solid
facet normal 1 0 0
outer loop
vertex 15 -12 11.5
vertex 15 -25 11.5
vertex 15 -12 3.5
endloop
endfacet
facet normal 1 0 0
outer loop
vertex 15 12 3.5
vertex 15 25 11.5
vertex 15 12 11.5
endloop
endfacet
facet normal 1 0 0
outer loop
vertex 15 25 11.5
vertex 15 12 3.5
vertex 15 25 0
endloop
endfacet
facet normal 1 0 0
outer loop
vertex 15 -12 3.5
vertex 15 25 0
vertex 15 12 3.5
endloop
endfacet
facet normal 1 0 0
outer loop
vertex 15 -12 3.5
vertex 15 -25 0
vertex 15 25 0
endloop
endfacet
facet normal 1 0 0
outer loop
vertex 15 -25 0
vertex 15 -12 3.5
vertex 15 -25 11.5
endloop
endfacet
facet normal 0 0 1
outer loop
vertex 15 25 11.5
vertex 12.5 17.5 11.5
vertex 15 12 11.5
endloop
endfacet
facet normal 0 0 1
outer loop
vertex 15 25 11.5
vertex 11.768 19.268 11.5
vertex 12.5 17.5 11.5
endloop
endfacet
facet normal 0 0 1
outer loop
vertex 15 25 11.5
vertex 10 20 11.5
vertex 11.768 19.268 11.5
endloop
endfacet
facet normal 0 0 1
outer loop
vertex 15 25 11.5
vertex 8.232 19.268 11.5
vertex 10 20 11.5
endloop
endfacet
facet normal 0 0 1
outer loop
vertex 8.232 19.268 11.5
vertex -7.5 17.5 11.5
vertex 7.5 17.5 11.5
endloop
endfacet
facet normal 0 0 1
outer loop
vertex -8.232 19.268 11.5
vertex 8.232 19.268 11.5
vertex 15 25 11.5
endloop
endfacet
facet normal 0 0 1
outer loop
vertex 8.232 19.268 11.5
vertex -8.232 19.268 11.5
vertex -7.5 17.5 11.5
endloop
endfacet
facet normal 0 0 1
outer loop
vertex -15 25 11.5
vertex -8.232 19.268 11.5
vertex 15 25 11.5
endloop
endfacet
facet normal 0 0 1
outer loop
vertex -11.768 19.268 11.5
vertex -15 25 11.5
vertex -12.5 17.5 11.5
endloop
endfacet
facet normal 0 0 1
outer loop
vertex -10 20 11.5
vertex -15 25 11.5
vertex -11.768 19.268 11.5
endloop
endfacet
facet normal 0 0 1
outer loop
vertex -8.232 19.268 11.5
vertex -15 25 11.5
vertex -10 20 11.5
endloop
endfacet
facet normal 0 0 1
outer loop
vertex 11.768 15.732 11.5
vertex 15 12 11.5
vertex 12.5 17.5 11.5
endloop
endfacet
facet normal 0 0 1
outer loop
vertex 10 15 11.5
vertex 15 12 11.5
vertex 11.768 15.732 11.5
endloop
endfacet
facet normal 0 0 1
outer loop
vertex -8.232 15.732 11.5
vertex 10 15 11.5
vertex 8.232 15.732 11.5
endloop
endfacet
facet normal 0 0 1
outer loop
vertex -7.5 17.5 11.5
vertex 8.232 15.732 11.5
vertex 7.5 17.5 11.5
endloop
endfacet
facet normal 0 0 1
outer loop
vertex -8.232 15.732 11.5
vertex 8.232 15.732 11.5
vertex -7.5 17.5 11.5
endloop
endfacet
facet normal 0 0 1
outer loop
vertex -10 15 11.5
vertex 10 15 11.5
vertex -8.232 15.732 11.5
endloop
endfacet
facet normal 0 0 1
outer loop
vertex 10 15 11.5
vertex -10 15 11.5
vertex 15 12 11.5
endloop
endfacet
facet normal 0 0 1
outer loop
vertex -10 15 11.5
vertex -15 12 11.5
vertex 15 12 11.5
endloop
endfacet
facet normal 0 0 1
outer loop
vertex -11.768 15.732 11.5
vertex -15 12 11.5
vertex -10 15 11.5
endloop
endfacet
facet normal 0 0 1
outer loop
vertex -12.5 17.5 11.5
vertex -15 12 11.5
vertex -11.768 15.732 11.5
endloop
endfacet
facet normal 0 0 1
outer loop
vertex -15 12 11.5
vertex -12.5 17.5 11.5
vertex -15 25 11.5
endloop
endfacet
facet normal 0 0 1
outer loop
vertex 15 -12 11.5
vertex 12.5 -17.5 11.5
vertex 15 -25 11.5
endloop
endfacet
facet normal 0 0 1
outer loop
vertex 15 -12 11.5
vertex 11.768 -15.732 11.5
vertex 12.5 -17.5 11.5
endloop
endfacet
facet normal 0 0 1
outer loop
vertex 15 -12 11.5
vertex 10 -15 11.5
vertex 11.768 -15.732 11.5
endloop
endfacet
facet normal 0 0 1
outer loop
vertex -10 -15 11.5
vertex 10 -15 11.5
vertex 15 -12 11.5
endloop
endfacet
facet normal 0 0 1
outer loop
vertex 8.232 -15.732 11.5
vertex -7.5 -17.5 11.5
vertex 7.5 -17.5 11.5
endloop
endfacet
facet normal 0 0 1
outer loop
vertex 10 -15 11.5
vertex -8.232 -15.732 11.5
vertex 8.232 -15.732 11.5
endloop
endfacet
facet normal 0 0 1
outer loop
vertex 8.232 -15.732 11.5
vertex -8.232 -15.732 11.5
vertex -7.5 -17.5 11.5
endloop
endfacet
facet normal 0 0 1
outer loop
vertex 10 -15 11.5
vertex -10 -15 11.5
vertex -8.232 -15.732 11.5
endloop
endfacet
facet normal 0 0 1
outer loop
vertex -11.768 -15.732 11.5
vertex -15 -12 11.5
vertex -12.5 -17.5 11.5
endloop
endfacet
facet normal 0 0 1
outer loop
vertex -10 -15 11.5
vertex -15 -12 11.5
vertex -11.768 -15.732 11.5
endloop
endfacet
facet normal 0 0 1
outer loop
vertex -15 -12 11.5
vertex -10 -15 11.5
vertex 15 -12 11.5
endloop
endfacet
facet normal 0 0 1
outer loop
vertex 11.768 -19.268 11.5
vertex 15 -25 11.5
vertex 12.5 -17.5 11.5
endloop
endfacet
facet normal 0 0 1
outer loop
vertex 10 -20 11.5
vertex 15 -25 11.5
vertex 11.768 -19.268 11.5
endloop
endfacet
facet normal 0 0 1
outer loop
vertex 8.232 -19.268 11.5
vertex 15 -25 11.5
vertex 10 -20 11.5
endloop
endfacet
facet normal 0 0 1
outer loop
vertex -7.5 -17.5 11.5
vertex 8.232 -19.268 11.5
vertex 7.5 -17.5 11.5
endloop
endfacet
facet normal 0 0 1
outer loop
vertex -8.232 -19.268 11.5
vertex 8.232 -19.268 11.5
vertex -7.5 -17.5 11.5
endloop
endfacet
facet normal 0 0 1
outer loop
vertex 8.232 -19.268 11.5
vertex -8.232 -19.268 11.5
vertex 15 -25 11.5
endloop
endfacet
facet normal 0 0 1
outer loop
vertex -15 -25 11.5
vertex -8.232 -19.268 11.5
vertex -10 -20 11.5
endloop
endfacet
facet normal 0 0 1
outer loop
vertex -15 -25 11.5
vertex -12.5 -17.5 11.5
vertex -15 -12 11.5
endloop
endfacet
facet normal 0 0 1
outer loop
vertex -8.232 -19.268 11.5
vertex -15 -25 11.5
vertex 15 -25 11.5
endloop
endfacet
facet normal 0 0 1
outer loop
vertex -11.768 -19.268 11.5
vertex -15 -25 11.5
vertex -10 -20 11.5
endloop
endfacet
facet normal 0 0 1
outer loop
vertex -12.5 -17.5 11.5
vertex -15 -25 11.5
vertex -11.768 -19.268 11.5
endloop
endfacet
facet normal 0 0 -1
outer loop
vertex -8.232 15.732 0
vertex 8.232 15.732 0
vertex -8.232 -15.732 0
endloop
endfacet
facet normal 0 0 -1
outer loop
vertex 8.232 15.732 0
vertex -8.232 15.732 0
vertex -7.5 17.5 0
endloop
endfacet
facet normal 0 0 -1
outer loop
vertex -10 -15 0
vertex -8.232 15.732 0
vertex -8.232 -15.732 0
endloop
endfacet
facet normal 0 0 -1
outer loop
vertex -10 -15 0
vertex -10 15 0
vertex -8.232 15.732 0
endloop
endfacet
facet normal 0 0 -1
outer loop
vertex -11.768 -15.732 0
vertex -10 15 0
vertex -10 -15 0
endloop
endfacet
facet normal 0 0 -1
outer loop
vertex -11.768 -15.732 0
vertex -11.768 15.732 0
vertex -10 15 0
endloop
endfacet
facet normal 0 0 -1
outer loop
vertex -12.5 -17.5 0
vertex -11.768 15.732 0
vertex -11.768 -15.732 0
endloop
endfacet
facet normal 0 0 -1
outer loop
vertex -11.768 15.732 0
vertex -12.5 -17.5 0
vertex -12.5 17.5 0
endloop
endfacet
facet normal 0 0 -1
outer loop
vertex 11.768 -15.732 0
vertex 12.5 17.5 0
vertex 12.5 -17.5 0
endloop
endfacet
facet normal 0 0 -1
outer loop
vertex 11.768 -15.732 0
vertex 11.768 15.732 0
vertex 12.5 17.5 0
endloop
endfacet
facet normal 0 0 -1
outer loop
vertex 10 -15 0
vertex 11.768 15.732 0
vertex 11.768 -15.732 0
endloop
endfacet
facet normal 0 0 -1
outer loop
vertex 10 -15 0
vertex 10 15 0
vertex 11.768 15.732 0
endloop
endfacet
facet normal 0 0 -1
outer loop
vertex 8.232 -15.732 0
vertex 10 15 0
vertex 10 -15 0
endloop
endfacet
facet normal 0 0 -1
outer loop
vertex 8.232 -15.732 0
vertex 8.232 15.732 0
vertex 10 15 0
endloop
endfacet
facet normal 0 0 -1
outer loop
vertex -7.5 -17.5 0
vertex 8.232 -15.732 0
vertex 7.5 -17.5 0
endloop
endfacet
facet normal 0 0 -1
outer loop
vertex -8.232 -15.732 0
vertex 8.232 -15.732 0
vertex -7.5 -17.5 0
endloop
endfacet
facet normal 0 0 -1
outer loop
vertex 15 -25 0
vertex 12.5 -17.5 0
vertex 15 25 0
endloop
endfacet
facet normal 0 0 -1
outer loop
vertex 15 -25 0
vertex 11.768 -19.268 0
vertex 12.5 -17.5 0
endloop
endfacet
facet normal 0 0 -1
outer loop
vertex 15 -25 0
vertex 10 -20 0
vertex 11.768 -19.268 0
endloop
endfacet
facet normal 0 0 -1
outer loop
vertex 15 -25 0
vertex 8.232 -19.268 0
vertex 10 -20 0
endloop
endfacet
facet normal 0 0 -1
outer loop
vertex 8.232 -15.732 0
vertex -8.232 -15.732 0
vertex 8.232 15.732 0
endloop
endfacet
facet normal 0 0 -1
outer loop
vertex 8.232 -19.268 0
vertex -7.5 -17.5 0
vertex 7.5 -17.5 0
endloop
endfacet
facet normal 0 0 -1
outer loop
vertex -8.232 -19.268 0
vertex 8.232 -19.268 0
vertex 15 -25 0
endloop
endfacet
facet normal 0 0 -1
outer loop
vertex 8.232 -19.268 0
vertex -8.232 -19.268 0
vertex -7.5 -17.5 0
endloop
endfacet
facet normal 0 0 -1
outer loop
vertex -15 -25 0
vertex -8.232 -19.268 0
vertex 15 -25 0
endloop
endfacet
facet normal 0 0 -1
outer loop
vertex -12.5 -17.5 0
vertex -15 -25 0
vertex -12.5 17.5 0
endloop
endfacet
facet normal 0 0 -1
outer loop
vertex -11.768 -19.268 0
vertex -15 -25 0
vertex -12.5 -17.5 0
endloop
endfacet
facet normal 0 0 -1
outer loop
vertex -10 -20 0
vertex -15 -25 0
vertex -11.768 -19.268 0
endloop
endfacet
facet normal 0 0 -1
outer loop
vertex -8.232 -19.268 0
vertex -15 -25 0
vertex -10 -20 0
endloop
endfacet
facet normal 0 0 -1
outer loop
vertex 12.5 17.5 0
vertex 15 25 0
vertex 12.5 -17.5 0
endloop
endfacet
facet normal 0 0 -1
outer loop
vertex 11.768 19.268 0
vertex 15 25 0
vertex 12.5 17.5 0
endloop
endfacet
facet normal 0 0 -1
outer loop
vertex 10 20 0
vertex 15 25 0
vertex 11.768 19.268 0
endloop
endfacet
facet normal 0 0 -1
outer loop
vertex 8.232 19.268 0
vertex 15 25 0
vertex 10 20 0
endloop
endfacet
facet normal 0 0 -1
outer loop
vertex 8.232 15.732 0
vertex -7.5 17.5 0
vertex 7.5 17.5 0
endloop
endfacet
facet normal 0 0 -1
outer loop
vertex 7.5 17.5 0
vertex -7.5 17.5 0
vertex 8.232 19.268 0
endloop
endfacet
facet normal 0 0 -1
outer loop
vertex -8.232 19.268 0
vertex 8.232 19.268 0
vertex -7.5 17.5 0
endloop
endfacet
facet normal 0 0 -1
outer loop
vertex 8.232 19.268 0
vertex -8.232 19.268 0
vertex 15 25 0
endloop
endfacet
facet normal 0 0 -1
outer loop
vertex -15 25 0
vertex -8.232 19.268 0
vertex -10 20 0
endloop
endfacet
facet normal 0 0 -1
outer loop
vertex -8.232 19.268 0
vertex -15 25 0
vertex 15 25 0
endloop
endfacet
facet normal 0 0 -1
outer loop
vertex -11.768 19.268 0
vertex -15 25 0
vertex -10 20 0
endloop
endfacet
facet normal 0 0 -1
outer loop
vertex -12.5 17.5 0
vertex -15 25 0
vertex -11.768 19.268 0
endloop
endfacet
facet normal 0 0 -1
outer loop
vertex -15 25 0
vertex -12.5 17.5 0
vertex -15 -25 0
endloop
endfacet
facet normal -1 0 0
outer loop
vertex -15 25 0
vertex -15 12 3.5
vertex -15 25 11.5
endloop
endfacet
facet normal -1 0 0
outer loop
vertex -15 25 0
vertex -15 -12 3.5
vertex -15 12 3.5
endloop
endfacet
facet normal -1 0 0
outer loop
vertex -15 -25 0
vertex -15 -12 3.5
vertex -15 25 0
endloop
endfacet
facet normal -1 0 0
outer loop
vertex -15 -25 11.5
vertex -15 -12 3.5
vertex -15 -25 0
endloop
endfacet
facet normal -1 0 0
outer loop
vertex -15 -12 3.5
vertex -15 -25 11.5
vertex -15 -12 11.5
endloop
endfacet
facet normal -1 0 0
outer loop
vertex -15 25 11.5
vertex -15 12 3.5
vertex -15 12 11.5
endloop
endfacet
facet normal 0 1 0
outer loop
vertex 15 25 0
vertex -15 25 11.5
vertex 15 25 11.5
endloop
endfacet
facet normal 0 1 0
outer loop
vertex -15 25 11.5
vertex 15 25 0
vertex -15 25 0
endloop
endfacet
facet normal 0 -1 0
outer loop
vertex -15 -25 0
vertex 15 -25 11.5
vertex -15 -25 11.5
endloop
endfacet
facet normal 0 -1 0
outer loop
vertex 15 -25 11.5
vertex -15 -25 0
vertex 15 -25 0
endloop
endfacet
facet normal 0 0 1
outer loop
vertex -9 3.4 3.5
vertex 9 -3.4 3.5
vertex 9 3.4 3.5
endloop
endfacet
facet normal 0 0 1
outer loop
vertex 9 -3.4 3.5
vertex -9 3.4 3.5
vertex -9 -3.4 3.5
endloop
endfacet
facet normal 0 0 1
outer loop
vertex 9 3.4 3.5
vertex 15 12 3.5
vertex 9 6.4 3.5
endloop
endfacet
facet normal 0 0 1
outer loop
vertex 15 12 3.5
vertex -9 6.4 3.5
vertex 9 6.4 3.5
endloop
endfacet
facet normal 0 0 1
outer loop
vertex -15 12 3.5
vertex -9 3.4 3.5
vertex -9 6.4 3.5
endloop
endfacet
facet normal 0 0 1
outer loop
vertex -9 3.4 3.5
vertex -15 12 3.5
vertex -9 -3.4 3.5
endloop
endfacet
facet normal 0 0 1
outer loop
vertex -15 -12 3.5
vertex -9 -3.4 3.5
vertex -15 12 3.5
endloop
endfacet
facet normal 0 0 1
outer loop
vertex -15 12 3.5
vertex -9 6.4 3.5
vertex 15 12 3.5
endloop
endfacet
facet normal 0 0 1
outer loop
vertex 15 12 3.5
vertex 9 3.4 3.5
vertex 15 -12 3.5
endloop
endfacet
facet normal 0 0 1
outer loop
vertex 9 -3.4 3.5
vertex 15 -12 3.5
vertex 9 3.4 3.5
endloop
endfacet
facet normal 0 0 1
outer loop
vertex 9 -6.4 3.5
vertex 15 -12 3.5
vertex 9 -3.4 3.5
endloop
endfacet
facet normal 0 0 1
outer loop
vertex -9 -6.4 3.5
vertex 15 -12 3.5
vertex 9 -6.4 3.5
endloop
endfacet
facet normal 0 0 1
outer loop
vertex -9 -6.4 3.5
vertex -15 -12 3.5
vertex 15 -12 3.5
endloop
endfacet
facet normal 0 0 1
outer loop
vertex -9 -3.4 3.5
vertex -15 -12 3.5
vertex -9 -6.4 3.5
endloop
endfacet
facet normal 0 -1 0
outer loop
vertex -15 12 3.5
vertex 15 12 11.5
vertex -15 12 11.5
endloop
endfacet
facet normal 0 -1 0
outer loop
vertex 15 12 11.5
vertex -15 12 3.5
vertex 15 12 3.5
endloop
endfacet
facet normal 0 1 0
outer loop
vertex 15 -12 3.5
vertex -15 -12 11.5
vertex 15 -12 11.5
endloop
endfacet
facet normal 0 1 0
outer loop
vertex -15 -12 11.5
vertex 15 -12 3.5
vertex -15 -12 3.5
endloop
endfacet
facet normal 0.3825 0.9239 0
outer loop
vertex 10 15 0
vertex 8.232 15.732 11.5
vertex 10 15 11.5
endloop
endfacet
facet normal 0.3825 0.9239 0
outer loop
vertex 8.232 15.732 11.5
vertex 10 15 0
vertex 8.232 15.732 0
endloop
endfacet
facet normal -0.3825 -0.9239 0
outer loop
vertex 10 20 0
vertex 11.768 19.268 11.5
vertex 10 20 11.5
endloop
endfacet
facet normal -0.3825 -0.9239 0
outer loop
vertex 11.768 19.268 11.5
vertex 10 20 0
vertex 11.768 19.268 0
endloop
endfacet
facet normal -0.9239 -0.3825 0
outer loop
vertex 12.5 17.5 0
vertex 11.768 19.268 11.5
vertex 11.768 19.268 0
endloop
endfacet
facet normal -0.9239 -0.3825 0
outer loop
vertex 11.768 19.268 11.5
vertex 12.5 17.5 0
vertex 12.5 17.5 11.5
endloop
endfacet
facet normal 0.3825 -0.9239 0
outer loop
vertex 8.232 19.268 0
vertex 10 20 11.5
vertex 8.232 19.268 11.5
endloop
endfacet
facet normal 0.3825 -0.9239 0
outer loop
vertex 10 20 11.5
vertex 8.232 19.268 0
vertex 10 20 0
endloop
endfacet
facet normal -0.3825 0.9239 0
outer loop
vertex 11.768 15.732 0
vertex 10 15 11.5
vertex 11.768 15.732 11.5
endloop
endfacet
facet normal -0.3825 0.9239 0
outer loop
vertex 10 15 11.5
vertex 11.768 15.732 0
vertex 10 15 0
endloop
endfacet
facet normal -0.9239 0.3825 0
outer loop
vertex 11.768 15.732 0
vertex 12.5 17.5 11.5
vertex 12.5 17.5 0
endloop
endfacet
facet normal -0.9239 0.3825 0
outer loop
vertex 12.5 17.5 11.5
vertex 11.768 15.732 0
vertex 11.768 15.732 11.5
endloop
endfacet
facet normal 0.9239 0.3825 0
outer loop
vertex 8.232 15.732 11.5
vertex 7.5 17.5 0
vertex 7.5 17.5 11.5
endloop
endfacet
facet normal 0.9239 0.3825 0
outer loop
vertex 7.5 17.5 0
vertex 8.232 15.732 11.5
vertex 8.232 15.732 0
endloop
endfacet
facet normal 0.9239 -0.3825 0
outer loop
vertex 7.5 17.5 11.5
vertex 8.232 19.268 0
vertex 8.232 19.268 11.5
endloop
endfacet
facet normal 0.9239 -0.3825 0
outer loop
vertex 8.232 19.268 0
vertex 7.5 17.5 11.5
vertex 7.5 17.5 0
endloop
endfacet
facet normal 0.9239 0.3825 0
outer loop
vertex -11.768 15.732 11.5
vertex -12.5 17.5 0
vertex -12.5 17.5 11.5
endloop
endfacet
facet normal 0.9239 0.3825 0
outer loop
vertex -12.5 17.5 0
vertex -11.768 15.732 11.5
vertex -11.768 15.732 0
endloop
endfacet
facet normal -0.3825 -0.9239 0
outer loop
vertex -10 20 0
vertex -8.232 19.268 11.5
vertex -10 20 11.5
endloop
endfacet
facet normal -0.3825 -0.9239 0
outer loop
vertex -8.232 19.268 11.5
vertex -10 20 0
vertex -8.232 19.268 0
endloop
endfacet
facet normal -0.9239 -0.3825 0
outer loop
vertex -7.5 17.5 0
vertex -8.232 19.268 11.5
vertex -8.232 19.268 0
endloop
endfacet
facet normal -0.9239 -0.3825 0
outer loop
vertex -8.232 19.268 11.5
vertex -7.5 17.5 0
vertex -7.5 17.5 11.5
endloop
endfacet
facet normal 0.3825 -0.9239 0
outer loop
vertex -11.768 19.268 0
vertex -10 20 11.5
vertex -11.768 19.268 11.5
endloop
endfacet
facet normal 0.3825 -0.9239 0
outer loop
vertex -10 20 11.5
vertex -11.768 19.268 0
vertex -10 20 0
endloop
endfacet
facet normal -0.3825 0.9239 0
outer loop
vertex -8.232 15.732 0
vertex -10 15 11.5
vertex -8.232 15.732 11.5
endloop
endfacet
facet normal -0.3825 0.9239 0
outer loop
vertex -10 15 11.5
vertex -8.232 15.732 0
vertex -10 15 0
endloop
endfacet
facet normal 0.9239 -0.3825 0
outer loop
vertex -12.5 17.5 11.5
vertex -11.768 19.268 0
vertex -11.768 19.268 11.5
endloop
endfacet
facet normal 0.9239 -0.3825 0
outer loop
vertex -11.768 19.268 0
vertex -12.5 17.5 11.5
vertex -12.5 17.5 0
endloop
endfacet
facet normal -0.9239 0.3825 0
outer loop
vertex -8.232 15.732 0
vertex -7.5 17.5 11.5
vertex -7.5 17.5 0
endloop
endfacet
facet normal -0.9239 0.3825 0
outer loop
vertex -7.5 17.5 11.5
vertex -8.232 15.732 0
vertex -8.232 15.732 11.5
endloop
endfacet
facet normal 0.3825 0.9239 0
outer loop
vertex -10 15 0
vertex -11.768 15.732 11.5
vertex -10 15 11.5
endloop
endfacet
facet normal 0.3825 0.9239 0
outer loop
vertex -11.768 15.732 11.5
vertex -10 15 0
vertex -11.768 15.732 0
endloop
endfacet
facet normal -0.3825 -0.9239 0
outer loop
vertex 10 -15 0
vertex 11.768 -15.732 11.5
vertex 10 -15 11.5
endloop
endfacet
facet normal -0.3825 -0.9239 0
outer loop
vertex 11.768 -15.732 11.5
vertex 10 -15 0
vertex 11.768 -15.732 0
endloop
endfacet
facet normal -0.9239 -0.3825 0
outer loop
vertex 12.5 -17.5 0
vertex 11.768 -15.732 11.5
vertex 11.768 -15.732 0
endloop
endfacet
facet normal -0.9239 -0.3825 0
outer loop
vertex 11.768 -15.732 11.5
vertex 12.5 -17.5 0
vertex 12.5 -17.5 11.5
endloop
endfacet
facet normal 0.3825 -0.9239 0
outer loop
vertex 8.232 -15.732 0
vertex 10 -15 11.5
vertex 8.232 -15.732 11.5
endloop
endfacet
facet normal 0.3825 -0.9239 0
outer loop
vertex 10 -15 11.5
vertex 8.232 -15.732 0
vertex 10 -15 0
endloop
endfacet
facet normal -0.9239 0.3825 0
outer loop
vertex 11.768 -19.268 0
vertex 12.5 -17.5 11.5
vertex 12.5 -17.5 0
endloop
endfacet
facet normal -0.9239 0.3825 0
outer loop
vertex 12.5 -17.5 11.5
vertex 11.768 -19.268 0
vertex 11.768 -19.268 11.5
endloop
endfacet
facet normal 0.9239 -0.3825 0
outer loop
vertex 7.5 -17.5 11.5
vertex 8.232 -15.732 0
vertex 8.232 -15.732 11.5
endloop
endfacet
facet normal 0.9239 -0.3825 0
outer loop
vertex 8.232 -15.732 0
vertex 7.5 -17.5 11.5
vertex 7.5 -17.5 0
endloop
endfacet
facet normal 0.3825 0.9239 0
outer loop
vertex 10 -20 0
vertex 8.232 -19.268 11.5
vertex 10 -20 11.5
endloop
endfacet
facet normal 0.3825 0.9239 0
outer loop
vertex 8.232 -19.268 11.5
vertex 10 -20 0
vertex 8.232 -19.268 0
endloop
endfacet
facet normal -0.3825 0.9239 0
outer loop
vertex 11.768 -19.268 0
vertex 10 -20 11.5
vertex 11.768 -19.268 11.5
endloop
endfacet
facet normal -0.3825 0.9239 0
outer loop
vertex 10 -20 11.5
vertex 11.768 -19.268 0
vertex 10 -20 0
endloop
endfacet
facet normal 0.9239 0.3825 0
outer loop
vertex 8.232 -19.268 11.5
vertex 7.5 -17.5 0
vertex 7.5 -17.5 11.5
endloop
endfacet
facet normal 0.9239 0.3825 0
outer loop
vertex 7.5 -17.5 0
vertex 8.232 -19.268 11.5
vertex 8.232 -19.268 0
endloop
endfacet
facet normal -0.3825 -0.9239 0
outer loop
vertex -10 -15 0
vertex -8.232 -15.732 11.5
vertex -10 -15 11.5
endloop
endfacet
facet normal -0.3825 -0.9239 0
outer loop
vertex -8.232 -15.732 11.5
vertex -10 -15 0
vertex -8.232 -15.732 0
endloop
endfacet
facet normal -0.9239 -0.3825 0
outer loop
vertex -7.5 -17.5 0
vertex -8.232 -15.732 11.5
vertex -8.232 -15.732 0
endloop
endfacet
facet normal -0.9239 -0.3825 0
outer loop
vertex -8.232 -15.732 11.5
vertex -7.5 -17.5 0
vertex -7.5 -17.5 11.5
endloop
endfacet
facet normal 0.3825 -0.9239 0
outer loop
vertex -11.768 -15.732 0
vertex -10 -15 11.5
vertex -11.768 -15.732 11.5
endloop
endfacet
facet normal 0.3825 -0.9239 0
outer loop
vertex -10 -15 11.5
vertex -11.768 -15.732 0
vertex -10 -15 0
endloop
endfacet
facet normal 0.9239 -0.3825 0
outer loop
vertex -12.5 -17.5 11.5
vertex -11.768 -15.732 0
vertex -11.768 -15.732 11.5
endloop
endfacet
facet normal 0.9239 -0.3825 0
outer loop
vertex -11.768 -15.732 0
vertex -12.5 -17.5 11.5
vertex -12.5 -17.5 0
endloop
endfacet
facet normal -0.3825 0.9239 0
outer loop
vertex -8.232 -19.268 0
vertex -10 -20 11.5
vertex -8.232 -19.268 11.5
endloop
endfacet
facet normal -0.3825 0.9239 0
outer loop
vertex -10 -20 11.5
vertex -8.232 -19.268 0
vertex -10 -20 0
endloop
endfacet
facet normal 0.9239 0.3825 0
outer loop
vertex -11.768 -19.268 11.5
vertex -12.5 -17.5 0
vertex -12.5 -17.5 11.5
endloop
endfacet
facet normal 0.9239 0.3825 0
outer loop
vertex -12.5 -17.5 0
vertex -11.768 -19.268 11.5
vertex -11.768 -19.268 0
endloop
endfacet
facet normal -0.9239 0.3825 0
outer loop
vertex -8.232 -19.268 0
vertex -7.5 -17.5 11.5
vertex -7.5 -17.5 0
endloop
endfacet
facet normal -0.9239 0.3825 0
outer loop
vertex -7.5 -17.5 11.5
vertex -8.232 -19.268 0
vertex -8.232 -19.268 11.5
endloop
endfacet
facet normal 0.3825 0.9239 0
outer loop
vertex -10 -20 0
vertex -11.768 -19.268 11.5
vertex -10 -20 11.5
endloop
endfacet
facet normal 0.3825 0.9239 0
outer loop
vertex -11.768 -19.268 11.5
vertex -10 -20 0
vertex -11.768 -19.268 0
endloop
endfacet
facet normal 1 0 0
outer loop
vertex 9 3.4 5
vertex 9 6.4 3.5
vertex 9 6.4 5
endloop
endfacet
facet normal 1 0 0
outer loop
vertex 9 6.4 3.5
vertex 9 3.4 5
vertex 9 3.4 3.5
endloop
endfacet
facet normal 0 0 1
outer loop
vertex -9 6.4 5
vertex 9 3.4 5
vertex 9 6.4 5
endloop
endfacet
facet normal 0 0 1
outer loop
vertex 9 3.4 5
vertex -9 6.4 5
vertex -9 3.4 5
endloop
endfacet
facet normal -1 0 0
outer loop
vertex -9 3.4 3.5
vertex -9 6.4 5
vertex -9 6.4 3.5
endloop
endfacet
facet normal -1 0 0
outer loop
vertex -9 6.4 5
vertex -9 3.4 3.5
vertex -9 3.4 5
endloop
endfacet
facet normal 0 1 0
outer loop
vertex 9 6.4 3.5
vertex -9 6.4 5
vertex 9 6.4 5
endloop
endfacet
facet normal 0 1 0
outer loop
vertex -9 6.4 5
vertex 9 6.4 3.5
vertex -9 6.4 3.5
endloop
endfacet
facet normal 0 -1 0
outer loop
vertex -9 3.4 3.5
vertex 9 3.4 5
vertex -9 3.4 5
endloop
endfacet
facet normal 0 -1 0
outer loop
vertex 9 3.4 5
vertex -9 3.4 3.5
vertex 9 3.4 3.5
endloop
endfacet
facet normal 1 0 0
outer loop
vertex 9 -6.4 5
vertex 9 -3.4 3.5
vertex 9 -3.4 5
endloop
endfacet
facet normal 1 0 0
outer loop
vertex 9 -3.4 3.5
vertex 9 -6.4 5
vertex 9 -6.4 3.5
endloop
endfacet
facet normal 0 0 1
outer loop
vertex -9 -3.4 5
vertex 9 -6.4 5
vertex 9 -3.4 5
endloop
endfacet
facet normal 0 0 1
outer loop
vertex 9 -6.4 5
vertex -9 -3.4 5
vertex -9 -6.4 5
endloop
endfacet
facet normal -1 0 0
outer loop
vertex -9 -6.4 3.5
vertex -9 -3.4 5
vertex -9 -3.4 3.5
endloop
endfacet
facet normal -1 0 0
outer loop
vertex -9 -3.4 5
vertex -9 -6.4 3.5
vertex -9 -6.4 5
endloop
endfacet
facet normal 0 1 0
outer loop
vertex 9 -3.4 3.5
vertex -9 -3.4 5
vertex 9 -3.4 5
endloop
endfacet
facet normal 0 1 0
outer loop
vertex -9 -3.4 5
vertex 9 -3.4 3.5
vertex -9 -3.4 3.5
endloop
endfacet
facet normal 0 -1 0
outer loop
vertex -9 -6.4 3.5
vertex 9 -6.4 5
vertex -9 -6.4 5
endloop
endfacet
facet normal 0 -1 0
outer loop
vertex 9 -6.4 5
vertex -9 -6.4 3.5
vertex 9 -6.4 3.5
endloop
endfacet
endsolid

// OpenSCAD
difference()
{
    translate([0,0,11.5]/2) cube ([30,50,11.5],center=true);
    translate([0,0,50]/2 + [0,0,11.5 - 8]) cube([40,24,50],center=true);


translate([20,35,0]/2) cylinder(d=5, h=50,  center=true);
translate([-20,35,0]/2) cylinder(d=5, h=50,  center=true);
    translate([20,-35,0]/2) cylinder(d=5, h=50,  center=true);
    translate([-20,-35,0]/2) cylinder(d=5, h=50,  center=true);
}
translate([0,(6.8+3)/2,11.5-8]) cube([18,3,3],center=true);
translate([0,-(6.8+3)/2,11.5-8]) cube([18,3,3],center=true);
